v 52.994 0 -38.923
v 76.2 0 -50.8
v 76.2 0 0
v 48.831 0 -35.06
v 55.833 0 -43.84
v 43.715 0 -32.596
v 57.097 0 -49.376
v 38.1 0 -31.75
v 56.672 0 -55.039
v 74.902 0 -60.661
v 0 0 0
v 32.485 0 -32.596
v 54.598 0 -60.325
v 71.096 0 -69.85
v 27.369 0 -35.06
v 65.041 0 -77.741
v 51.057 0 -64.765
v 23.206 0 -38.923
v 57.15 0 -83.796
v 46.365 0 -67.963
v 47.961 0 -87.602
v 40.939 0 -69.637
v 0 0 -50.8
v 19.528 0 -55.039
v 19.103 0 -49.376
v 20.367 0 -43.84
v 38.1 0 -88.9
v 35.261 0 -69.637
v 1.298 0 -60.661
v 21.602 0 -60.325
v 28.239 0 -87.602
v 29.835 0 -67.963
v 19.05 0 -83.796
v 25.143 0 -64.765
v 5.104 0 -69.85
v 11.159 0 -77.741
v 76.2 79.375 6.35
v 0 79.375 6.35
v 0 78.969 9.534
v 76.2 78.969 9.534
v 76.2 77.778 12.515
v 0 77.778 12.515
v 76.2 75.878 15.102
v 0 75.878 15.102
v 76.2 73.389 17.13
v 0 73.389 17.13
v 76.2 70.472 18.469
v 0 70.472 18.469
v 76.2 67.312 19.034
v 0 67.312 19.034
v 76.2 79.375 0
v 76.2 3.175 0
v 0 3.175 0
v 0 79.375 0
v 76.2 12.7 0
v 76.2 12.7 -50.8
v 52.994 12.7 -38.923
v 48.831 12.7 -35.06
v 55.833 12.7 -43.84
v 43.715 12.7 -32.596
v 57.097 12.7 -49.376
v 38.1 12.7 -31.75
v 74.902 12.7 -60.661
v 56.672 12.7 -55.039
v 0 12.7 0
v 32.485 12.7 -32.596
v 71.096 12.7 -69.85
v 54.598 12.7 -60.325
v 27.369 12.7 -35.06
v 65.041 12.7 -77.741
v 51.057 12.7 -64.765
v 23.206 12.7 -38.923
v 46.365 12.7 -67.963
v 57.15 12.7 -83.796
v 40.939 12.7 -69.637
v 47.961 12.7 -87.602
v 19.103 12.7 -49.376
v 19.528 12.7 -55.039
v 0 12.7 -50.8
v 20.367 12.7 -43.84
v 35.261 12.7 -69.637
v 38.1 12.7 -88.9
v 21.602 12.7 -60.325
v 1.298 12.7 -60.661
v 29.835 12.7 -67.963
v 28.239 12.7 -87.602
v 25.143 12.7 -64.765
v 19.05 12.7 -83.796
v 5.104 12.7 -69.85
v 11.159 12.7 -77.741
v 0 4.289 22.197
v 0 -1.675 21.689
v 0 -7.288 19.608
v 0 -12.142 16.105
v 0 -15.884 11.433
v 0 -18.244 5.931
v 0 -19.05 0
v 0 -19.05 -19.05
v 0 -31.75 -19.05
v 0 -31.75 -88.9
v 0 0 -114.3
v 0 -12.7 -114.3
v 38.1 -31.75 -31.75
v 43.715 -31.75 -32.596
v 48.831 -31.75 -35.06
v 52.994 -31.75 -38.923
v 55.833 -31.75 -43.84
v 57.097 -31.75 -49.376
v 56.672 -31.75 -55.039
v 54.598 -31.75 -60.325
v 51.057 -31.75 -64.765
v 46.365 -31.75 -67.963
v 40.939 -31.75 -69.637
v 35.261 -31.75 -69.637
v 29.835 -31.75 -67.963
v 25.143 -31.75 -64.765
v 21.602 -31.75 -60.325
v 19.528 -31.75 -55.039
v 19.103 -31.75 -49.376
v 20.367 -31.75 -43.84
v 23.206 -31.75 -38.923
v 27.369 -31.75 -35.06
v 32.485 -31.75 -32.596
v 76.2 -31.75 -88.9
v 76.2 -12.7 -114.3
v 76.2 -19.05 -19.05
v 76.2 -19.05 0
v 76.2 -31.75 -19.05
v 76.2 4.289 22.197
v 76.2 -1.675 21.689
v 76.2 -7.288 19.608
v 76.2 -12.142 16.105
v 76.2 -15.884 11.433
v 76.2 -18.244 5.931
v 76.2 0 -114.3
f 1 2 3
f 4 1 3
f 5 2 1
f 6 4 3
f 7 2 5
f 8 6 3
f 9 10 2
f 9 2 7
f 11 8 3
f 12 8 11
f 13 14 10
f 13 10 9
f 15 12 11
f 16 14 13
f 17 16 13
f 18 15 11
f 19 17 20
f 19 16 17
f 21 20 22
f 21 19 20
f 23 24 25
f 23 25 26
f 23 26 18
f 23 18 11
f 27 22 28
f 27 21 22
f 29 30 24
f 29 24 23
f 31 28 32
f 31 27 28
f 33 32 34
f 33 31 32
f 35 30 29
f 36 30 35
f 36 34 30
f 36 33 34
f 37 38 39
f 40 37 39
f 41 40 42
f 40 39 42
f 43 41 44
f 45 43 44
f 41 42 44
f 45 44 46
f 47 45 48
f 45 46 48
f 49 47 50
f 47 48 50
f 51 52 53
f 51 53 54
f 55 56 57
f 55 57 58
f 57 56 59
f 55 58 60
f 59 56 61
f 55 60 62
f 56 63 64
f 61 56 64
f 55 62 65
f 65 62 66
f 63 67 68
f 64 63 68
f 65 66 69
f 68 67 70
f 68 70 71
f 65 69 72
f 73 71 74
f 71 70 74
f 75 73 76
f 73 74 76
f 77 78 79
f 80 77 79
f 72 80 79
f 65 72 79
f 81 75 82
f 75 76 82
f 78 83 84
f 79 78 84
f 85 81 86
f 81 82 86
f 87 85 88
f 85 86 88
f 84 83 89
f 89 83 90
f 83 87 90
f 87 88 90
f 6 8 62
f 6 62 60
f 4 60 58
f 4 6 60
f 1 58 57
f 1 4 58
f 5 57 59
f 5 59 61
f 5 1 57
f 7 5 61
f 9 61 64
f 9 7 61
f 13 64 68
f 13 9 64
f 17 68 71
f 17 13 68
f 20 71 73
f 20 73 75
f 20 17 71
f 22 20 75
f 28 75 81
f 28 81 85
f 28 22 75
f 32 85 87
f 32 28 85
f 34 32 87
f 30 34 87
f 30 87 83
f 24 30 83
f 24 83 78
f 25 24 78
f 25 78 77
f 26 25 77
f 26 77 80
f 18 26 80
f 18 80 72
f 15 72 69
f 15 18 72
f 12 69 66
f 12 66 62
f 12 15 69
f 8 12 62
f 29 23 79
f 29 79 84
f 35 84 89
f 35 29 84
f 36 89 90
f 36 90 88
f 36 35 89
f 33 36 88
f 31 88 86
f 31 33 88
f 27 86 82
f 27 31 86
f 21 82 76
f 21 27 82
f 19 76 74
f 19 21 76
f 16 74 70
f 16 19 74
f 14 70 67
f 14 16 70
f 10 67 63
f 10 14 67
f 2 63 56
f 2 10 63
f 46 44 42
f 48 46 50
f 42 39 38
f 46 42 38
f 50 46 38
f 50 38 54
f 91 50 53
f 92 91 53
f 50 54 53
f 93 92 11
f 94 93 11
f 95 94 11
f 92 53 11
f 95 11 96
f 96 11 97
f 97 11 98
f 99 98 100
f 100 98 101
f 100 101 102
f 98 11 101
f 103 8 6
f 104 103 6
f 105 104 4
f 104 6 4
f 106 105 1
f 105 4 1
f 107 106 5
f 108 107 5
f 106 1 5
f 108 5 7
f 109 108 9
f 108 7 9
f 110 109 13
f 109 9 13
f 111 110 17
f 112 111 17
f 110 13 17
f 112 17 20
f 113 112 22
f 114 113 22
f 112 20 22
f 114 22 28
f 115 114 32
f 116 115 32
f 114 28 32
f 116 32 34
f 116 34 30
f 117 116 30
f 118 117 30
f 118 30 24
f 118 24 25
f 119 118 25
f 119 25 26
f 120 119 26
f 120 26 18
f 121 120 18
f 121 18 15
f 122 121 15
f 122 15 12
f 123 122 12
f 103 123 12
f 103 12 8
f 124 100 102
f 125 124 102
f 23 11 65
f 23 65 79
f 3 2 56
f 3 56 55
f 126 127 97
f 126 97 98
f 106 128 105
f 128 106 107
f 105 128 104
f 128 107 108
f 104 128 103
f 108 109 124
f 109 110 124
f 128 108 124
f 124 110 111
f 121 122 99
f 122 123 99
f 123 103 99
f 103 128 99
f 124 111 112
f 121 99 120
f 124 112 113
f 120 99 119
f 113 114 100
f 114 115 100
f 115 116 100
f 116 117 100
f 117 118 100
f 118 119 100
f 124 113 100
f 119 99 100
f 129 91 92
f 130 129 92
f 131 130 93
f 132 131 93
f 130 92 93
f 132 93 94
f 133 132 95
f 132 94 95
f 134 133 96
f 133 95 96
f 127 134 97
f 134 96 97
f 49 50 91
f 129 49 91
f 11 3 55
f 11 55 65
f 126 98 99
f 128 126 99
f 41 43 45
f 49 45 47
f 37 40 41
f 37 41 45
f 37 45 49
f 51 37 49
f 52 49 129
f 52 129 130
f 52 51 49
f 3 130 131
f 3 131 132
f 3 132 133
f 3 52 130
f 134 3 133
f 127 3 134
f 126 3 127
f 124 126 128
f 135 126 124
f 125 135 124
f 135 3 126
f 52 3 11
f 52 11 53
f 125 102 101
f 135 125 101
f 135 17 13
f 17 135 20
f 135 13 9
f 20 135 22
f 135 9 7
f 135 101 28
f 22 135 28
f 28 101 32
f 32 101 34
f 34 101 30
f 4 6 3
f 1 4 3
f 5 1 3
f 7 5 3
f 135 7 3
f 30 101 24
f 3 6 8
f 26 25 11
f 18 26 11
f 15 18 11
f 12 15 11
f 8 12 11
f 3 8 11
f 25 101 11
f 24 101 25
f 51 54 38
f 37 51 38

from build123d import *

# Parameters (mm, degrees)
EXTRUDE_1_DEPTH     = 76.2
SKETCH_1_R          = 19.05
EXTRUDE_2_DEPTH     = 12.7
SKETCH_2_R          = 19.05
CUT_EXTRUDE_1_DEPTH = 48.514


with BuildPart() as part:
    # Sketch 3D_1 → 凸台-拉伸1 (new body)
    with BuildSketch(Plane(origin=(0, -31.75, -19.05), x_dir=(0, 0.9748585065718673, 0.22282480150214104), z_dir=(-1, 0, 0))):
        with BuildLine():
            Line((0, 0), (-15.564312385, 68.093866684))
            Line((-15.564312385, 68.093866684), (-2.653007793, 97.10008522))
            Line((-2.653007793, 97.10008522), (9.727695241, 99.929960199))
            Line((9.727695241, 99.929960199), (35.196570052, -11.496367103))
            Line((35.196570052, -11.496367103), (38.291745811, -10.788898358))
            Line((38.291745811, -10.788898358), (112.575964011, 6.190351517))
            Line((112.575964011, 6.190351517), (113.990901501, 0))
            ThreePointArc((113.990901501, 0), (112.531634737, -9.311559159), (105.057107567, -15.053164948))
            Line((105.057107567, -15.053164948), (44.323836735, -32.179655803))
            ThreePointArc((44.323836735, -32.179655803), (26.948798496, -29.90141183), (16.625515502, -15.741179571))
            Line((16.625515502, -15.741179571), (12.380703033, 2.829874979))
            Line((12.380703033, 2.829874979), (0, 0))
        make_face()
    extrude(amount=-EXTRUDE_1_DEPTH)

    # 草图2 → 切除-拉伸1 (cut)
    with BuildSketch(Plane(origin=(0, 0, 0), x_dir=(1, 0, 0), z_dir=(0, 1, 0))):
        with Locations(Location((38.1, 50.8, 0), (0, 0, 270))):
            Circle(SKETCH_2_R)
    extrude(amount=-CUT_EXTRUDE_1_DEPTH, mode=Mode.SUBTRACT)


with BuildPart() as body_2:
    # 草图1 → 凸台-拉伸2 (new body)
    with BuildSketch(Plane(origin=(0, 0, 0), x_dir=(1, 0, 0), z_dir=(0, 1, 0))):
        with BuildLine():
            Line((0, 0), (0, 50.8))
            ThreePointArc((0, 50.8), (38.1, 88.9), (76.2, 50.8))
            Line((76.2, 50.8), (76.2, 0))
            Line((76.2, 0), (0, 0))
        make_face()
        with Locations(Location((38.1, 50.8, 0), (0, 0, 270))):
            Circle(SKETCH_1_R, mode=Mode.SUBTRACT)
    extrude(amount=EXTRUDE_2_DEPTH)


solid = Compound([part.part, body_2.part])
